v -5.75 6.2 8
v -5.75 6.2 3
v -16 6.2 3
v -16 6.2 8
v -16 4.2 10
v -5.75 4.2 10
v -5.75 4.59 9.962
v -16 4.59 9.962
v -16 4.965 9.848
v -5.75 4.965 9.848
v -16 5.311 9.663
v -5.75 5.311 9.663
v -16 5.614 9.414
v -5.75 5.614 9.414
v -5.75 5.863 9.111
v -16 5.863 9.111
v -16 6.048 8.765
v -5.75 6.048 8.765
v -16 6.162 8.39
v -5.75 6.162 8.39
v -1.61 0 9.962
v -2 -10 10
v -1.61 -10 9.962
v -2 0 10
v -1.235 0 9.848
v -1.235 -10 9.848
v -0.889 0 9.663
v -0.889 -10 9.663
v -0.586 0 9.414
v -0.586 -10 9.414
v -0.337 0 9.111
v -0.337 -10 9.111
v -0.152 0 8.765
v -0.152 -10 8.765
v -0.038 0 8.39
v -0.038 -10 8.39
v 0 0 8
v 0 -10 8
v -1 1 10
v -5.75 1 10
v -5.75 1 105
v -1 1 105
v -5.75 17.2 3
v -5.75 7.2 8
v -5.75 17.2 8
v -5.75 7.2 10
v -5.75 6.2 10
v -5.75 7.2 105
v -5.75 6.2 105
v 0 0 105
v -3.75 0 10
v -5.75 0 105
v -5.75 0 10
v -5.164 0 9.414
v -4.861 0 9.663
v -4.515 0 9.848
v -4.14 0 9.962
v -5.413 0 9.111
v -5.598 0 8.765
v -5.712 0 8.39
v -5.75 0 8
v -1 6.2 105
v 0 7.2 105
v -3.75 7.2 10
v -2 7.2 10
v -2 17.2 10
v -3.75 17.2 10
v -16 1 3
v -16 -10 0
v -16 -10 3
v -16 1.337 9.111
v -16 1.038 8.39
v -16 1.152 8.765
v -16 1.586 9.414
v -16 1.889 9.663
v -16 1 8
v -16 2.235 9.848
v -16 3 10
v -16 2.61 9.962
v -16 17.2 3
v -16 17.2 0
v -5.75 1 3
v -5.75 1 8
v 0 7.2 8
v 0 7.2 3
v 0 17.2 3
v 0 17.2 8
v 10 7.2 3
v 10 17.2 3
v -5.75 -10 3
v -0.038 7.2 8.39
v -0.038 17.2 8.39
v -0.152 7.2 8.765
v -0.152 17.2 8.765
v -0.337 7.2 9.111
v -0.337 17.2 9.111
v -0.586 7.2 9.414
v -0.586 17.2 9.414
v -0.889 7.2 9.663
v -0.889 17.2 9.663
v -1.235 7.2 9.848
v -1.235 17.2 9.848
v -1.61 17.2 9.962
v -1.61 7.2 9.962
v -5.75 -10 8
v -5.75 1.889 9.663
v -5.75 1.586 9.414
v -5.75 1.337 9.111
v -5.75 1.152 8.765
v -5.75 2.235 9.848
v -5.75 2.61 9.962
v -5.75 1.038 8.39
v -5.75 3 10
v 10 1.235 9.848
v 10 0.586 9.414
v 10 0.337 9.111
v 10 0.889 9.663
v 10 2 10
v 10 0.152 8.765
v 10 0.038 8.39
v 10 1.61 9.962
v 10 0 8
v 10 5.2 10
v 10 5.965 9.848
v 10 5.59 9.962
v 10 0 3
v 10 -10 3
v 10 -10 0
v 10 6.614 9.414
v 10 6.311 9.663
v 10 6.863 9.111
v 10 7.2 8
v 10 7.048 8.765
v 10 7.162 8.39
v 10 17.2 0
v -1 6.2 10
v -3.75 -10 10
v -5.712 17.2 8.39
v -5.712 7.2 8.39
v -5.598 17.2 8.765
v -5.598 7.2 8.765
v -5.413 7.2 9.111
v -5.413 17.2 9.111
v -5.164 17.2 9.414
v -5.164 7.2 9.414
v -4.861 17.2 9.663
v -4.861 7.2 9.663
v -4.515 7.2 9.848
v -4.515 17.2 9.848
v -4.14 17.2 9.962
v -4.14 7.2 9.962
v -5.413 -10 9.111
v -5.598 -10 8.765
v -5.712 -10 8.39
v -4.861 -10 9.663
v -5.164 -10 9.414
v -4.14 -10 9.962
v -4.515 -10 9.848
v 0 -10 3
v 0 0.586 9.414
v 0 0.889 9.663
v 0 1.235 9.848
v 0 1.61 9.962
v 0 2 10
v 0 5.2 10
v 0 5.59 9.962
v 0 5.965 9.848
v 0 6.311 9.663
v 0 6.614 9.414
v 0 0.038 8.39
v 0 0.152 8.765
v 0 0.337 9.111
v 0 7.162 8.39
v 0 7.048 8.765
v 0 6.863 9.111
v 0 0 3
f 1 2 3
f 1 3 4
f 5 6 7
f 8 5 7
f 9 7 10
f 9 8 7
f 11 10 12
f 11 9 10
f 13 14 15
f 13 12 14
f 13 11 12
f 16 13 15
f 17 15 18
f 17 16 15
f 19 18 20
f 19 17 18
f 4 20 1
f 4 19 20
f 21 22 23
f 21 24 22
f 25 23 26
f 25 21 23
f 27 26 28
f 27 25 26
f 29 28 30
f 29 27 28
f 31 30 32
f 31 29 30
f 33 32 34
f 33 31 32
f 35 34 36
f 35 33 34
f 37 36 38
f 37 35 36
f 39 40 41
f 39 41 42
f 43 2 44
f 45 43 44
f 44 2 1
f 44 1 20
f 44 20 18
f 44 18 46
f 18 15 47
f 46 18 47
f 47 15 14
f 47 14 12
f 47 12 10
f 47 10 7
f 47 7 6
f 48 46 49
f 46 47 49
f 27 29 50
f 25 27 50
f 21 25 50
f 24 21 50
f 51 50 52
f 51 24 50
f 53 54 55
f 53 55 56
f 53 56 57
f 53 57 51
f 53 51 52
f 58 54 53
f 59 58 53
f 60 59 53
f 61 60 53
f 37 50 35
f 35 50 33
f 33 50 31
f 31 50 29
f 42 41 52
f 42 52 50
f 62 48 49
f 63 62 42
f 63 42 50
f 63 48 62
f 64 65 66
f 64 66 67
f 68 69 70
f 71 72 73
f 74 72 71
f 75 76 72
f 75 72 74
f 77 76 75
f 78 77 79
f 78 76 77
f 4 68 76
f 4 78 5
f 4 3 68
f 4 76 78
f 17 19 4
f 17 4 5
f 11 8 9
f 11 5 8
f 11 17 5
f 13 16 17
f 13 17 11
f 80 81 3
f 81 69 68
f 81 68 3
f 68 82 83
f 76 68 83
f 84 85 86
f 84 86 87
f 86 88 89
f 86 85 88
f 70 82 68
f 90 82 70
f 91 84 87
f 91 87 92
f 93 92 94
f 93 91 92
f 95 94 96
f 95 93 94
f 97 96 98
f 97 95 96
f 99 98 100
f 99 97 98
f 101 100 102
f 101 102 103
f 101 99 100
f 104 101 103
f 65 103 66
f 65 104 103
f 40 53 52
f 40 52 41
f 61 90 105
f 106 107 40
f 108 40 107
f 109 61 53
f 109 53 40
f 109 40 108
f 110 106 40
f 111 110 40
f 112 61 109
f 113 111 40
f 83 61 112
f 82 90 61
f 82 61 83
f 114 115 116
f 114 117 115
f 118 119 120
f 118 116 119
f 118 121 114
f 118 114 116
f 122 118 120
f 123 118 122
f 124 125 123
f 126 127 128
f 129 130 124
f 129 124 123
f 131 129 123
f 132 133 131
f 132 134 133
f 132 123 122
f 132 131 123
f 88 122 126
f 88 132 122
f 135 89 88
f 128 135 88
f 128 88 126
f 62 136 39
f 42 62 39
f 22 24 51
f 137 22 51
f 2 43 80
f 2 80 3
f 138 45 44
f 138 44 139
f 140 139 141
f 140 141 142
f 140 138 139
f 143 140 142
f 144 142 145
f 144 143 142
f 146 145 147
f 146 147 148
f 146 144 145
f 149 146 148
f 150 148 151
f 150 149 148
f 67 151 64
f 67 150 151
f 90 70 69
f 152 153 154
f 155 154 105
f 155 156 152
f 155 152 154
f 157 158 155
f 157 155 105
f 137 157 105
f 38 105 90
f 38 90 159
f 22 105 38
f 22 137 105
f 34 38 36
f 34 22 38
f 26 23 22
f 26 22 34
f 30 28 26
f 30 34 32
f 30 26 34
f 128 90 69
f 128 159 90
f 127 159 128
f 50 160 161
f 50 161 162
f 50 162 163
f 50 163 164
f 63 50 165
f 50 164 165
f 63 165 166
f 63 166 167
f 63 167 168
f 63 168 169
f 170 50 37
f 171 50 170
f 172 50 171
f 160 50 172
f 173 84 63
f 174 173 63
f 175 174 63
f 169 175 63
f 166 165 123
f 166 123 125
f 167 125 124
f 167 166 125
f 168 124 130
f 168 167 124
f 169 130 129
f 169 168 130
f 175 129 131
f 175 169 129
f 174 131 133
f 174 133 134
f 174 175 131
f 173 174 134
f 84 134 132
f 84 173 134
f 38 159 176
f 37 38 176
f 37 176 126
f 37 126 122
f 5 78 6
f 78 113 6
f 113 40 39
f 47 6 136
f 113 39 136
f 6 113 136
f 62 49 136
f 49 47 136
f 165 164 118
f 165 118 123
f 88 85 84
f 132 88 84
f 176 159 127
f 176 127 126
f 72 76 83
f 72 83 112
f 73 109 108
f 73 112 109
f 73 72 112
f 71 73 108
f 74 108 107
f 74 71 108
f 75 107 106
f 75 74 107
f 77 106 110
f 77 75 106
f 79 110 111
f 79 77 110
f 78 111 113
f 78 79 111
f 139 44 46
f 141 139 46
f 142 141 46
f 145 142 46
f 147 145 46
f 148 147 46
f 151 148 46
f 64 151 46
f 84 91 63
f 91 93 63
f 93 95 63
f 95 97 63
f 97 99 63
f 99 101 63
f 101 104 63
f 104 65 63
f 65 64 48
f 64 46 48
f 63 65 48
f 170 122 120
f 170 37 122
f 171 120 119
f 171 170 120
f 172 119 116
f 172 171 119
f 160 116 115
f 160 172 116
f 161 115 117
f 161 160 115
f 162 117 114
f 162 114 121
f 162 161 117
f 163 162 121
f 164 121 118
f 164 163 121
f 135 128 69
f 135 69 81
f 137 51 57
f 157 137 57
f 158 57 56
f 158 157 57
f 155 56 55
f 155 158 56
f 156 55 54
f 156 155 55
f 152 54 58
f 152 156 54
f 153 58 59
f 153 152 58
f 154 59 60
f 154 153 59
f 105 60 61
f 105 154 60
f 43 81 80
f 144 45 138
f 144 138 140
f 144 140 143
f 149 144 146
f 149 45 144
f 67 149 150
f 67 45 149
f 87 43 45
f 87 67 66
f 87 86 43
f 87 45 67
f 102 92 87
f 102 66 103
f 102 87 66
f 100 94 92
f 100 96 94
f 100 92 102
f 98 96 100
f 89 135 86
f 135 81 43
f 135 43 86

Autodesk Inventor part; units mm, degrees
ref_plane "YZ Plane" through (0, 0, 0) normal (1, 0, 0) x (0, 1, 0)
ref_plane "XZ Plane" through (0, 0, 0) normal (0, 1, 0) x (-1, 0, 0)
ref_plane "XY Plane" through (0, 0, 0) normal (0, 0, 1) x (1, 0, 0)
sketch "Esboço1" plane through (0, 0, 0) normal (0, 0, 1) x (1, 0, 0)
  point P0 (0, 0)
sketch "Esboço2" plane through (0, 0, 0) normal (0, 0, 1) x (1, 0, 0)
  line L0 (0, 0) -> (0, 7.2)
  line L1 (0, 7.2) -> (-5.75, 7.2)
  line L2 (-5.75, 7.2) -> (-5.75, 6.2)
  line L3 (-5.75, 6.2) -> (-1, 6.2)
  line L4 (-1, 6.2) -> (-1, 1)
  line L5 (0, 0) -> (-5.75, 0)
  line L6 (-5.75, 0) -> (-5.75, 1)
  line L7 (-5.75, 1) -> (-1, 1)
  dimension "d0" = 7.2
  dimension "d1" = 1
  dimension "d2" = 5.75
  dimension "d3" = 4.75
  dimension "d4" = 5.2
extrude "Extrusão1" add sketch "Esboço2" along normal blind 105
sketch "Esboço3" plane through (-5.75, 0, 0) normal (0, -1, 0) x (1, 0, 0)
  line L0 (5.75, 0) -> (5.75, 105) projected
  line L1 (5.75, 0) -> (5.75, 10)
  line L2 (5.75, 10) -> (0, 10)
  line L3 (0, 0) -> (0, 105) projected
  line L4 (0, 10) -> (0, 0)
  line L5 (0, 0) -> (5.75, 0) projected
  line L6 (0, 0) -> (5.75, 0)
  dimension "d7" = 10
extrude "Extrusão2" add sketch "Esboço3" along normal blind 10
sketch "Esboço4" plane through (0, 0, 105) normal (1, 0, 0) x (0, 0, -1)
  line L0 (105, -10) -> (105, 7.2) projected
  line L1 (105, 0) -> (105, 7.2)
  line L2 (95, 0) -> (95, -10) projected
  line L3 (105, 0) -> (95, 0)
  line L4 (95, 0) -> (95, 7.2)
  line L5 (105, 7.2) -> (0, 7.2) projected
  line L6 (95, 7.2) -> (105, 7.2)
extrude "Extrusão3" add sketch "Esboço4" along normal blind 10
sketch "Esboço5" plane through (-5.75, 7.2, 105) normal (0, 1, 0) x (1, 0, 0)
  line L0 (0, 105) -> (5.75, 105)
  line L1 (0, 105) -> (15.75, 105) projected
  line L2 (5.75, 105) -> (5.75, 95) projected
  line L3 (5.75, 95) -> (5.75, 105)
  line L4 (5.75, 95) -> (5.75, 0) projected
  line L5 (5.75, 105) -> (5.75, 95)
  line L6 (5.75, 95) -> (0, 95)
  line L7 (0, 105) -> (0, 0) projected
  line L8 (0, 95) -> (0, 105)
extrude "Extrusão4" add sketch "Esboço5" along normal blind 10
sketch "Esboço6" plane through (0, 7.2, 10) normal (1, 0, 0) x (0, 0, -1)
  line L0 (10, -6.2) -> (10, -17.2) projected
  line L1 (10, -7.2) -> (0, -7.2) projected
  line L2 (10, -17.2) -> (7, -17.2)
  line L3 (7, -17.2) -> (7, -7.2)
  line L4 (7, -7.2) -> (10, -7.2)
  line L5 (10, -7.2) -> (10, -17.2)
  line L6 (10, -1) -> (10, 10) projected
  line L7 (10, 10) -> (0, 10) projected
  line L8 (10, 0) -> (7, 0)
  line L9 (7, 0) -> (7, 10)
  line L10 (7, 10) -> (10, 10)
  line L11 (10, 10) -> (10, 0)
  dimension "d14" = 3
extrude "Extrusão5" add sketch "Esboço6" along normal blind 10
fillet "Arredondamento1" radius 2 4 edges at (5, 7.2, 10) (0, 12.2, 10) (5, 0, 10) (0, -5, 10)
sketch "Esboço7" plane through (-1, 1, 0) normal (-1, 0, 0) x (0, 0, 1)
  line L0 (10, -1) -> (10, -11) projected
  line L1 (10, 16.2) -> (10, 6.2) projected
  line L2 (10, -1) -> (10, 6.2)
  line L3 (0, 0) -> (0, -11) projected
  line L4 (0, 5.2) -> (105, 5.2) projected
  line L5 (0, 0) -> (10, 0)
  line L6 (10, 0) -> (10, 5.2)
  line L7 (10, 5.2) -> (0, 5.2)
  line L8 (0, 5.2) -> (0, 0)
  point P0 (0, -1)
extrude "Extrusão6" add sketch "Esboço7" along normal blind 15
sketch "Esboço8" plane through (-5.75, 7.2, 10) normal (-1, 0, 0) x (0, 0, 1)
  line L0 (-10, 10) -> (0, 10) projected
  line L1 (-7, -7.2) -> (-7, -17.2) projected
  line L2 (-10, 10) -> (-7, 10)
  line L3 (-7, 10) -> (-7, -17.2)
  line L4 (-7, -17.2) -> (-10, -17.2)
  line L5 (-10, -17.2) -> (-10, 10)
  point P0 (-10, -7.2)
extrude "Extrusão7" add sketch "Esboço8" along normal blind 10.25
fillet "Arredondamento2" radius 2 4 edges at (-5.75, 12.2, 10) (-10.875, 6.2, 10) (-10.875, 1, 10) (-5.75, -5, 10)
properties part number "suporte para arma"
